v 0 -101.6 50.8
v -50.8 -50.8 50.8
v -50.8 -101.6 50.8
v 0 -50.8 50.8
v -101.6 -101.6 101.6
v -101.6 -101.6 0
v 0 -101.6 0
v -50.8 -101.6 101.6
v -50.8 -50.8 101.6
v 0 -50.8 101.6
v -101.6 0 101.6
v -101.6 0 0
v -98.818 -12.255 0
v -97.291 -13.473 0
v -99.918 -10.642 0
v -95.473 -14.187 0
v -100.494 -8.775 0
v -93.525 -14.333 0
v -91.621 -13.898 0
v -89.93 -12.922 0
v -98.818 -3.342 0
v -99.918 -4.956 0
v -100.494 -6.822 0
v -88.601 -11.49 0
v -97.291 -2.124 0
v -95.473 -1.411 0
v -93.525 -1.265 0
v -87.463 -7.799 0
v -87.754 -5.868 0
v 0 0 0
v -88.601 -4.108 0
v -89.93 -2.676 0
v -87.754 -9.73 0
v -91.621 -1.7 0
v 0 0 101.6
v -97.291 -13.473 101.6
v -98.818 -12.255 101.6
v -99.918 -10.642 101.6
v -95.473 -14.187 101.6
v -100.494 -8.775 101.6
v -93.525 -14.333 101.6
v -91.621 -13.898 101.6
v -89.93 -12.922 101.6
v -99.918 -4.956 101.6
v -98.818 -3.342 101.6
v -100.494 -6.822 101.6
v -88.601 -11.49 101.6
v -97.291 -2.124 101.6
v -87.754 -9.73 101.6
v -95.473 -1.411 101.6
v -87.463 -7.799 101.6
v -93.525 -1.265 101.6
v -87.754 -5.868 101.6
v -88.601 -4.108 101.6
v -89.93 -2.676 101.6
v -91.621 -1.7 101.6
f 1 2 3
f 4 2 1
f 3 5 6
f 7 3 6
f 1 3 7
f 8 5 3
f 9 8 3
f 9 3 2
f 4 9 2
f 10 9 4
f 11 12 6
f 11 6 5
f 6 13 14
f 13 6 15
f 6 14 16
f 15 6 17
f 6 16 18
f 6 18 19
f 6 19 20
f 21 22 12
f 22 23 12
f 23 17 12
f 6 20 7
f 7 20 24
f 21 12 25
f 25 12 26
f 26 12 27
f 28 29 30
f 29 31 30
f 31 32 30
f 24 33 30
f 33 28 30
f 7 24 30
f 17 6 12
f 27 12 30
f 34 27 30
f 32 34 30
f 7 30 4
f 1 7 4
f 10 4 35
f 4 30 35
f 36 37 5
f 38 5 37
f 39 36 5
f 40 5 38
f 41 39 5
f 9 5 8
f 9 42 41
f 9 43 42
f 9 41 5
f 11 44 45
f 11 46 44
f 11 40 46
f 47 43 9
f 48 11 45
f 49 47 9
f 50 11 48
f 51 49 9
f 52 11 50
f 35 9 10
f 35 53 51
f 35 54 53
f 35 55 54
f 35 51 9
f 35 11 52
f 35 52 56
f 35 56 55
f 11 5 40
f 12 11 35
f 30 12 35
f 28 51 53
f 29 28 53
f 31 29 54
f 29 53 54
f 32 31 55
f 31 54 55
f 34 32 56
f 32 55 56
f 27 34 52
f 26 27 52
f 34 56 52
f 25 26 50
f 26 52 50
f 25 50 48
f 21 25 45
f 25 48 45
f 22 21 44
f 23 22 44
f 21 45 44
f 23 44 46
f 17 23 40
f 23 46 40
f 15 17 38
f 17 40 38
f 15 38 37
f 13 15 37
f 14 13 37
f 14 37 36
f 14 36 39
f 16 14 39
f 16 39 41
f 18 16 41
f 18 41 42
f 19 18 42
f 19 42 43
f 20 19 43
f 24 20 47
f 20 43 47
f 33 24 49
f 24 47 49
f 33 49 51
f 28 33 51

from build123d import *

# Parameters (mm, degrees)
F0_W     = 101.6
F0_H     = 101.6
F1_DEPTH = 101.6
F2_R     = 6.552167
F3_DEPTH = 101.6
F4_W     = 50.8
F4_H     = 50.8
F5_DEPTH = 50.8


with BuildPart() as f1:
    # F0 (on Front) → F1 (new body)
    with BuildSketch(Plane.XZ):
        with Locations((-50.8, 50.8)):
            Rectangle(F0_W, F0_H)
    extrude(amount=F1_DEPTH)

    # F2 (on face) → F3 (cut)
    with BuildSketch(Plane.XY.offset(101.6)):
        with Locations((-94.014853, -7.79883)):
            Circle(F2_R)
    extrude(amount=-F3_DEPTH, mode=Mode.SUBTRACT)

    # F4 (on face) → F5 (cut)
    with BuildSketch(Plane.XY.offset(101.6)):
        with Locations((-25.4, -76.2)):
            Rectangle(F4_W, F4_H)
    extrude(amount=-F5_DEPTH, mode=Mode.SUBTRACT)


solid = f1.part
